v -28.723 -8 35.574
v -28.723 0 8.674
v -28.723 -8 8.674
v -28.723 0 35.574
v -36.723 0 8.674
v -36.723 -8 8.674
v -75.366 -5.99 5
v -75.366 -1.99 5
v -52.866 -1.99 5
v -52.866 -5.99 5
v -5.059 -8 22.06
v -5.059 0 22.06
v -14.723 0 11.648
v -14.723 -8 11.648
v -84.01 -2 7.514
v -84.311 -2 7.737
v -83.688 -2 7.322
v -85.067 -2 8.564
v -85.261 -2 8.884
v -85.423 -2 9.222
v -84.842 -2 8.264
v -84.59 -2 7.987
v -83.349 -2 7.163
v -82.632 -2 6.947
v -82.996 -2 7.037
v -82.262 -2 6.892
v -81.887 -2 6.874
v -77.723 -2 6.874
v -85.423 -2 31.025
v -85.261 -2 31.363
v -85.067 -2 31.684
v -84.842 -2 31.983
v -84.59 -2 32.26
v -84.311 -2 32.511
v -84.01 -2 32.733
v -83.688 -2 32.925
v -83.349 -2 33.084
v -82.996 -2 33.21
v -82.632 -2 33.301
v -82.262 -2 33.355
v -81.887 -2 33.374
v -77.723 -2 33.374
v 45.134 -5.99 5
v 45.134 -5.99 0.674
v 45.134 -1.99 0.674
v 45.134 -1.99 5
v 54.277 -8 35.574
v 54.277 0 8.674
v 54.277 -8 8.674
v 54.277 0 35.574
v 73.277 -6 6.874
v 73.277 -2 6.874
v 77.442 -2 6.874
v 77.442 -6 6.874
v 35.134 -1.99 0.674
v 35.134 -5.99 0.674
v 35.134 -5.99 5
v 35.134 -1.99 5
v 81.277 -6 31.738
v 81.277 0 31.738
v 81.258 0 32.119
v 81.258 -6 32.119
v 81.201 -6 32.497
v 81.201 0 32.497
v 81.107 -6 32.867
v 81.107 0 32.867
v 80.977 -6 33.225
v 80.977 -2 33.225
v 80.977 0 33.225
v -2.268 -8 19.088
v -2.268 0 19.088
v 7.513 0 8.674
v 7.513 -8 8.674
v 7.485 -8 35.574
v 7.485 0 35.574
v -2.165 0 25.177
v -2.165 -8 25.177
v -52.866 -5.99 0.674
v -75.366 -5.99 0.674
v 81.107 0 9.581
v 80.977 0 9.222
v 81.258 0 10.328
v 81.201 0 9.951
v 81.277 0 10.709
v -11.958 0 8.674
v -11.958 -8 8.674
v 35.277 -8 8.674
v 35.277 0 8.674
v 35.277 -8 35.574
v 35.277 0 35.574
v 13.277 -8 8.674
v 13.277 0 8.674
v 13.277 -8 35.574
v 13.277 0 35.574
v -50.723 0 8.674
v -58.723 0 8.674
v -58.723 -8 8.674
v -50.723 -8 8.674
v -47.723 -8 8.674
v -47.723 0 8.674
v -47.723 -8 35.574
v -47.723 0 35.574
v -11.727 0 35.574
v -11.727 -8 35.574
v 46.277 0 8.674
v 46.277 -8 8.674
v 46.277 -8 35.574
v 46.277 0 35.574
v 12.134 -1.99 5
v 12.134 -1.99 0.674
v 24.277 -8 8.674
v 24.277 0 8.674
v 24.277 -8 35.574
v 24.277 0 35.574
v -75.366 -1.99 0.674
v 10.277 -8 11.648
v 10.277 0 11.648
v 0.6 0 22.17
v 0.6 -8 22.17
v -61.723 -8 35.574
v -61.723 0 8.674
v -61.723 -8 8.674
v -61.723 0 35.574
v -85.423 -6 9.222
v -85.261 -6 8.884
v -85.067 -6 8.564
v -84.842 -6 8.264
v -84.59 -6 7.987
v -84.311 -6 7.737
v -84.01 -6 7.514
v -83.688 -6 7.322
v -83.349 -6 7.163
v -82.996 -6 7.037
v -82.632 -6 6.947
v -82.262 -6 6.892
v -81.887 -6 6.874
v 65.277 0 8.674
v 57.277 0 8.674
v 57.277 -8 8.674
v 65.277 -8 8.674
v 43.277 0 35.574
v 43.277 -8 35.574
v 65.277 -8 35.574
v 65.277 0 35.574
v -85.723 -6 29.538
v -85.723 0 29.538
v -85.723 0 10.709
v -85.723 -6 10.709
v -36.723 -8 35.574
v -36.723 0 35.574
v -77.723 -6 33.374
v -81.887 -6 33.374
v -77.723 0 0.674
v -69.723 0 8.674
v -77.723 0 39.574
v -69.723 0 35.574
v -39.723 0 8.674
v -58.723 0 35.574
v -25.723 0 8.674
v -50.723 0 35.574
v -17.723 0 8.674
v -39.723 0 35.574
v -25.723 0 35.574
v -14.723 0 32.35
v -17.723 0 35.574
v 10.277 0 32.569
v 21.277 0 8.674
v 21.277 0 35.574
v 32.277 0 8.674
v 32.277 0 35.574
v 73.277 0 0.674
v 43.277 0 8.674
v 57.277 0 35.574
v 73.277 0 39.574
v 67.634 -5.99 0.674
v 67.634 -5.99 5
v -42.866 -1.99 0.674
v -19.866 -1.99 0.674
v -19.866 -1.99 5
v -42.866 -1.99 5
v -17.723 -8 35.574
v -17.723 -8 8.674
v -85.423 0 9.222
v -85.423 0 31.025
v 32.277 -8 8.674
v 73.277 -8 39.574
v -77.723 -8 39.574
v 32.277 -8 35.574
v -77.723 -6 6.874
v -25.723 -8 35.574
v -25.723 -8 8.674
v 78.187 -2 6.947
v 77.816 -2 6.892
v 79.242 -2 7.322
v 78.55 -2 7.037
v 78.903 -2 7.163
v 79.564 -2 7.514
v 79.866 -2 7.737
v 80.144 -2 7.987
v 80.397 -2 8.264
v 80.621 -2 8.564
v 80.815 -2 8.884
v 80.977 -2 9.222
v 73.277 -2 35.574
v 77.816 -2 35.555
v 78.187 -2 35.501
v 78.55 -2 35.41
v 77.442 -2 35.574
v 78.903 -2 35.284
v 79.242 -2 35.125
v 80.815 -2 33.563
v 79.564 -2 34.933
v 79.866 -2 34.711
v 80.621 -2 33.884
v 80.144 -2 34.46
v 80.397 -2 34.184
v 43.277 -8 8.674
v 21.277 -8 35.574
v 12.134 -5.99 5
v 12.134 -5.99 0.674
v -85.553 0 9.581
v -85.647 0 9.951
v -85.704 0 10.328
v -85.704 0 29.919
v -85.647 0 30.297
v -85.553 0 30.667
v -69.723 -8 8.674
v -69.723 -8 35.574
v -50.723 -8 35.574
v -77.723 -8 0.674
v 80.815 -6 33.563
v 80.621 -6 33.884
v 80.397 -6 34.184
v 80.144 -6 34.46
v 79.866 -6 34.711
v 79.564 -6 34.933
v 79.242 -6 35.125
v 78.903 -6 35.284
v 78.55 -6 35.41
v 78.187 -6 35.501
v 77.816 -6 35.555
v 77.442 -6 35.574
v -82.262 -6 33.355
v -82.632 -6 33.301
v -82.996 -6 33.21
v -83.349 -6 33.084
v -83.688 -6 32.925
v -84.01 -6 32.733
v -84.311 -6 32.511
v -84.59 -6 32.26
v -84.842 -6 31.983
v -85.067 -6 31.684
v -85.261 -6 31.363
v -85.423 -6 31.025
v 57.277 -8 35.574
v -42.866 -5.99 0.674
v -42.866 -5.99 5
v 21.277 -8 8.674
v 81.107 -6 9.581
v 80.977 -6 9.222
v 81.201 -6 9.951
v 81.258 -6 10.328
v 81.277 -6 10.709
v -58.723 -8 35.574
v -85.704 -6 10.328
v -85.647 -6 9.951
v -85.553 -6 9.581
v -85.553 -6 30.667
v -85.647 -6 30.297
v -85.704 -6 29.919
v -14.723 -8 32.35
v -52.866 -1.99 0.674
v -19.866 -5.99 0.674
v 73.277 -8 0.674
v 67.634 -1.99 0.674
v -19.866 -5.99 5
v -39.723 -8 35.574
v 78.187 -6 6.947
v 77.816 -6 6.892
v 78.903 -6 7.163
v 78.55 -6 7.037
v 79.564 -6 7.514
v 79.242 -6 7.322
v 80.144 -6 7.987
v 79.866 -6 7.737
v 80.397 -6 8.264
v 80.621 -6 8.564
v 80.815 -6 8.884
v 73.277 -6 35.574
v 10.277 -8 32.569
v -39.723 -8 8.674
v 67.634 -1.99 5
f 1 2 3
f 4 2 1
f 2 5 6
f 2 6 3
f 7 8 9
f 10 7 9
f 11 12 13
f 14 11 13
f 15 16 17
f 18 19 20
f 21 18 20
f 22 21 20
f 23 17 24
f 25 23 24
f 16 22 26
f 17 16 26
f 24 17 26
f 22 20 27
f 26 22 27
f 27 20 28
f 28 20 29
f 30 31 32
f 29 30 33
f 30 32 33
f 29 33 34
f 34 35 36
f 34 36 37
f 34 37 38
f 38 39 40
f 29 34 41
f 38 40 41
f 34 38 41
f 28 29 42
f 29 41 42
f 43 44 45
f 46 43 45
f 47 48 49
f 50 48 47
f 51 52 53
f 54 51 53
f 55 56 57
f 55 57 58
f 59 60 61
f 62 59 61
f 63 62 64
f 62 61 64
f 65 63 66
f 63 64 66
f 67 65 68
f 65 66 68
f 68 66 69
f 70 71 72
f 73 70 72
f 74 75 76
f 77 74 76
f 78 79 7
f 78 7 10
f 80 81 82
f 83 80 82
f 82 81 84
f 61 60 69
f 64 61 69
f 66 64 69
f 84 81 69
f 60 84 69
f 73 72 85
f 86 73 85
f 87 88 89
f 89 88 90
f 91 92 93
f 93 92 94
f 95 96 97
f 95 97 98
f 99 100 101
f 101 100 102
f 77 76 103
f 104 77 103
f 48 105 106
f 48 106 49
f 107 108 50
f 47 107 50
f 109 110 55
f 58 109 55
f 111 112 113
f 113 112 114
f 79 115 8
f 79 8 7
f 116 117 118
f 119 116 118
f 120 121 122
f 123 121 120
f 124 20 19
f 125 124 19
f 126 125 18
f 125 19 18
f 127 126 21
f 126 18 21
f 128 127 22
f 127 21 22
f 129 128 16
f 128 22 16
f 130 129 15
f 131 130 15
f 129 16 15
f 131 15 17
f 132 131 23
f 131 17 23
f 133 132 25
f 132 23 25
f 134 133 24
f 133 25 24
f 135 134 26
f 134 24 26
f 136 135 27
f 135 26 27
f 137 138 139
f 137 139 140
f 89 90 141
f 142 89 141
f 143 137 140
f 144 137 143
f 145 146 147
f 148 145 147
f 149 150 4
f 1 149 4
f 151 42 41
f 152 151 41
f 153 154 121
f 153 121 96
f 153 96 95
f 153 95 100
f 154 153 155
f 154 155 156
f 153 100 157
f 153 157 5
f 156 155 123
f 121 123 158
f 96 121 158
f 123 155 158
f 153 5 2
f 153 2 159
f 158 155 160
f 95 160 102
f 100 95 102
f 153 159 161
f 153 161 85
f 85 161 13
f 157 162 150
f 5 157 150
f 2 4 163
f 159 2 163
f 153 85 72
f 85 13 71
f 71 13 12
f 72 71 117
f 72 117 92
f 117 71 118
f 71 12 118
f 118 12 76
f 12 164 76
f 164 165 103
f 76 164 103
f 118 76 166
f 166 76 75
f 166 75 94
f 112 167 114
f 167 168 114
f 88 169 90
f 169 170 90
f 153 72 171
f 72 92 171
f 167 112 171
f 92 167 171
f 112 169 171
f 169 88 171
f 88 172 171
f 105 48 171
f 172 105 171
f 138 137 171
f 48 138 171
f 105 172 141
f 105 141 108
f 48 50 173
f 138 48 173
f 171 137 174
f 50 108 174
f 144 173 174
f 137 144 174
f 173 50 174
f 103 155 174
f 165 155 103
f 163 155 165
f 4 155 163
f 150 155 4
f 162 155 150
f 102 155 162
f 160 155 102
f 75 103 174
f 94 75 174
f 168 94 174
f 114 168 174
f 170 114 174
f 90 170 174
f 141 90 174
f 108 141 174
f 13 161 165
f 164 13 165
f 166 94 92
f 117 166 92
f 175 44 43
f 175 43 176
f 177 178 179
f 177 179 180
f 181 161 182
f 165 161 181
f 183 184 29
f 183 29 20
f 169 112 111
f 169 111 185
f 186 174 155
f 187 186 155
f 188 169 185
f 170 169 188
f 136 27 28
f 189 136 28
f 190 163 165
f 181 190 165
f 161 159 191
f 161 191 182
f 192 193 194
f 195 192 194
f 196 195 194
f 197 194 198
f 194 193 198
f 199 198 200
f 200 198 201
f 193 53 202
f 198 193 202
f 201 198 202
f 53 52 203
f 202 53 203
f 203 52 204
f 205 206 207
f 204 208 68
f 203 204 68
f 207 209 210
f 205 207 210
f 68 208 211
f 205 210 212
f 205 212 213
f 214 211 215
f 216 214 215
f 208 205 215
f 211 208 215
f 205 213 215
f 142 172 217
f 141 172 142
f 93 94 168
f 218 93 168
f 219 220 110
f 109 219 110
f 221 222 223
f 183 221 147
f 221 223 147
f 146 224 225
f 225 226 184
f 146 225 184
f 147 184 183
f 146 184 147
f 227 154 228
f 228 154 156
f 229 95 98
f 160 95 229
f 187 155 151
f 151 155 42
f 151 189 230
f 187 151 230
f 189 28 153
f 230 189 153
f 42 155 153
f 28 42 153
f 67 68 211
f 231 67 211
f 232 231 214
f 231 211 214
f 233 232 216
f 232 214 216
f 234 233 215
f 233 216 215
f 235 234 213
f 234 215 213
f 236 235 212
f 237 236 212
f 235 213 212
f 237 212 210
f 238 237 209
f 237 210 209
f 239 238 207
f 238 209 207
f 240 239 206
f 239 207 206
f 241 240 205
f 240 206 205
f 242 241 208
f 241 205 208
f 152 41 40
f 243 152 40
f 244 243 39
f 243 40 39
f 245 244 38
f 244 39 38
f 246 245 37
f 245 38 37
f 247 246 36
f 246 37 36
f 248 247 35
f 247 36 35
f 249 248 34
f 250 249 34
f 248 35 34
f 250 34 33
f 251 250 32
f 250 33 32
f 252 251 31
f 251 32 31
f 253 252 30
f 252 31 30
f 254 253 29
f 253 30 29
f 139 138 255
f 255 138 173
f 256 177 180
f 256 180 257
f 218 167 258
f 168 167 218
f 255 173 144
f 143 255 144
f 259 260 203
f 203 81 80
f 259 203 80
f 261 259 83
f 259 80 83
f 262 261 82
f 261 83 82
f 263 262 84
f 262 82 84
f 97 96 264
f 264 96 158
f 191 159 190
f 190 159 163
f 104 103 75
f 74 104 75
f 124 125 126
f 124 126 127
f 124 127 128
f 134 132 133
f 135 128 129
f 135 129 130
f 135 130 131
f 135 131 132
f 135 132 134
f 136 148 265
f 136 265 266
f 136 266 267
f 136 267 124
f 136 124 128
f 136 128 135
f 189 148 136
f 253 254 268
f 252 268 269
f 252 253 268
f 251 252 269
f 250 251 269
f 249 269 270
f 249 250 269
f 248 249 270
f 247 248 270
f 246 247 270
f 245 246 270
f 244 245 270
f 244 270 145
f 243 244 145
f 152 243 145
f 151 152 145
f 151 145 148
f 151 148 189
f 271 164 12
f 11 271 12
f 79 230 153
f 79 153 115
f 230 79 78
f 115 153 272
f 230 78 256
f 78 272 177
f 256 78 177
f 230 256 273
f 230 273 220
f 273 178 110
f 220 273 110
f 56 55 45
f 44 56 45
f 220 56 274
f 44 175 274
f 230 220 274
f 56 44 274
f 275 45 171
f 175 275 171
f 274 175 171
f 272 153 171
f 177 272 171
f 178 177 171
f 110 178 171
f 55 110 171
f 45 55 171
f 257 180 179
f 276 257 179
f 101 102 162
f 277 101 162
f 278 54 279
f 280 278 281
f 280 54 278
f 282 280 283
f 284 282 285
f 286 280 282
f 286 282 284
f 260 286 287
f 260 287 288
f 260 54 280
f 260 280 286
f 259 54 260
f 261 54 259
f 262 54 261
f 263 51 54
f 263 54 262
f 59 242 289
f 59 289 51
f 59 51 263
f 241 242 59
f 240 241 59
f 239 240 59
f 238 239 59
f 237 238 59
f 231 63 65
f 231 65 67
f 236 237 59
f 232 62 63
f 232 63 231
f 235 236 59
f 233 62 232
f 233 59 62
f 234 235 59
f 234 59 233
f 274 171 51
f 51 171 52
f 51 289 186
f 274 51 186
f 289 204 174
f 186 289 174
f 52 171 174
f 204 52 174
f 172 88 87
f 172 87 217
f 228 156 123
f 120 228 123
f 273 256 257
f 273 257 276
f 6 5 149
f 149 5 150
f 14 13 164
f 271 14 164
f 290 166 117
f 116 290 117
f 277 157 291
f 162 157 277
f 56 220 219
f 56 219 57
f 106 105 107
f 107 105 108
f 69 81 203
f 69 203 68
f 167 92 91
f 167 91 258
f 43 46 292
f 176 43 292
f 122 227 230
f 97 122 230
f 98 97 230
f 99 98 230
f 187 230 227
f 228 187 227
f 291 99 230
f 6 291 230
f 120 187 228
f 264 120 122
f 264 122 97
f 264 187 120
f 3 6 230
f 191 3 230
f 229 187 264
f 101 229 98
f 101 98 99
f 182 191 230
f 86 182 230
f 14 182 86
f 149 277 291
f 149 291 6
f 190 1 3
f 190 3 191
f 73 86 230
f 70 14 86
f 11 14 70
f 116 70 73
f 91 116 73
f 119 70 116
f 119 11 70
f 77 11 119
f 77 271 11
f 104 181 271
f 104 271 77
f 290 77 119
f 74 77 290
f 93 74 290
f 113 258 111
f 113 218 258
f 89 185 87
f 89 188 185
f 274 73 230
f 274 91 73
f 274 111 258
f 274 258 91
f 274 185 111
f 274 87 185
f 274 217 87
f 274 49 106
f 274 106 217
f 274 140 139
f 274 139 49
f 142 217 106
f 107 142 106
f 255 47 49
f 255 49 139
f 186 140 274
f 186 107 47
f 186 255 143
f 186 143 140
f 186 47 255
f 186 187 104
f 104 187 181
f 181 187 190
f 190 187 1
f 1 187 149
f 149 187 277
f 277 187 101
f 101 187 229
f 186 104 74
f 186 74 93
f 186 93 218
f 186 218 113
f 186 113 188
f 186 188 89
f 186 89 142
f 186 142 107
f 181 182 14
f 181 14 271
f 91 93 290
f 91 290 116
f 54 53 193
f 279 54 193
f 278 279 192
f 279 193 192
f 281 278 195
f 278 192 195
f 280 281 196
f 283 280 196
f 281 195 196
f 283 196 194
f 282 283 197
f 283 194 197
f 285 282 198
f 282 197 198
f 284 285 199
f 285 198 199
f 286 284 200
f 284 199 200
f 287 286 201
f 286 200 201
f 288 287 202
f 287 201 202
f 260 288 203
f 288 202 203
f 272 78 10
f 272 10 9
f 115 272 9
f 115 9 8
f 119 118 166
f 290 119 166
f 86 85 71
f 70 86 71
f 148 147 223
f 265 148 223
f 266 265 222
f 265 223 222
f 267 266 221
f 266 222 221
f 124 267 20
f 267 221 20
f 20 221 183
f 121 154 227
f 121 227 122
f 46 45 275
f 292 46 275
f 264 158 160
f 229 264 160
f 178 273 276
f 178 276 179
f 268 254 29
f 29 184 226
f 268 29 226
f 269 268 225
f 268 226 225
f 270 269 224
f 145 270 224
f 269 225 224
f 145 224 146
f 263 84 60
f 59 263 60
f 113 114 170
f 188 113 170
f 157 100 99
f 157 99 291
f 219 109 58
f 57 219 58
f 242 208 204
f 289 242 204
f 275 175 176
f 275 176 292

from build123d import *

# Parameters (mm, degrees)
F0_W     = 8
F0_H     = 26.900017
F1_DEPTH = 6
F2_DEPTH = 2
F3_DEPTH = 8
F4_W     = 23
F4_H     = 4
F4_W_2   = 22.5
F5_DEPTH = 5


with BuildPart() as f1:
    # F0 (on Front) → F1 (new body)
    with BuildSketch(Plane.XZ):
        with BuildLine():
            Line((-85.422808, 9.222019), (-85.422808, 31.025267))
            ThreePointArc((-85.422808, 31.025267), (-85.64706, 30.296735), (-85.722808, 29.538243))
            Line((-85.722808, 29.538243), (-85.722808, 10.709043))
            ThreePointArc((-85.722808, 10.709043), (-85.64706, 9.950551), (-85.422808, 9.222019))
        make_face()
        with BuildLine():
            ThreePointArc((81.277192, 31.73826), (81.201444, 32.496752), (80.977192, 33.225284))
            Line((80.977192, 33.225284), (80.977192, 9.222019))
            ThreePointArc((80.977192, 9.222019), (81.201444, 9.950551), (81.277192, 10.709043))
            Line((81.277192, 10.709043), (81.277192, 31.73826))
        make_face()
        with BuildLine():
            Line((77.441792, 35.57366), (73.277192, 35.57366))
            Line((73.277192, 35.57366), (73.277192, 11.555429))
            Line((73.277192, 11.555429), (73.277192, 8.673643))
            Line((73.277192, 8.673643), (73.277192, 6.873643))
            Line((73.277192, 6.873643), (77.441792, 6.873643))
            ThreePointArc((77.441792, 6.873643), (79.563932, 7.514232), (80.977192, 9.222019))
            Line((80.977192, 9.222019), (80.977192, 33.225284))
            ThreePointArc((80.977192, 33.225284), (79.563932, 34.93307), (77.441792, 35.57366))
        make_face()
        Polygon((-69.722808, 39.57366), (-77.722808, 39.57366), (-77.722808, 35.57366), (-77.722808, 33.373643), (-77.722808, 15.555412), (-77.722808, 8.673643), (-77.722808, 6.873643), (-77.722808, 0.673643), (-69.722808, 0.673643), (65.277192, 0.673643), (73.277192, 0.673643), (73.277192, 6.873643), (73.277192, 8.673643), (73.277192, 11.555429), (73.277192, 35.57366), (73.277192, 39.57366), (65.277192, 39.57366), align=None)
        Polygon((-11.958453, 8.673643), (-2.267612, 19.087933), (7.512836, 8.673643), align=None, mode=Mode.SUBTRACT)
        with Locations((-65.722808, 22.123651)):
            Rectangle(F0_W, F0_H, mode=Mode.SUBTRACT)
        with Locations((-54.722808, 22.123651)):
            Rectangle(F0_W, F0_H, mode=Mode.SUBTRACT)
        with Locations((-43.722808, 22.123651)):
            Rectangle(F0_W, F0_H, mode=Mode.SUBTRACT)
        with Locations((-32.722808, 22.123651)):
            Rectangle(F0_W, F0_H, mode=Mode.SUBTRACT)
        with Locations((-21.722808, 22.123651)):
            Rectangle(F0_W, F0_H, mode=Mode.SUBTRACT)
        Polygon((-14.722808, 11.648091), (-14.722808, 32.350313), (-5.058615, 22.059812), align=None, mode=Mode.SUBTRACT)
        Polygon((0.600276, 22.169918), (10.277192, 32.569243), (10.277192, 11.648091), align=None, mode=Mode.SUBTRACT)
        with Locations((17.277192, 22.123651)):
            Rectangle(F0_W, F0_H, mode=Mode.SUBTRACT)
        with Locations((28.277192, 22.123651)):
            Rectangle(F0_W, F0_H, mode=Mode.SUBTRACT)
        with Locations((39.277192, 22.123651)):
            Rectangle(F0_W, F0_H, mode=Mode.SUBTRACT)
        with Locations((50.277192, 22.123651)):
            Rectangle(F0_W, F0_H, mode=Mode.SUBTRACT)
        with Locations((61.277192, 22.123651)):
            Rectangle(F0_W, F0_H, mode=Mode.SUBTRACT)
        Polygon((7.484984, 35.57366), (-2.165283, 25.176943), (-11.727135, 35.57366), align=None, mode=Mode.SUBTRACT)
        with BuildLine():
            Line((-77.722808, 15.555412), (-77.722808, 33.373643))
            Line((-77.722808, 33.373643), (-81.887408, 33.373643))
            ThreePointArc((-81.887408, 33.373643), (-84.009549, 32.733053), (-85.422808, 31.025267))
            Line((-85.422808, 31.025267), (-85.422808, 9.222019))
            ThreePointArc((-85.422808, 9.222019), (-84.009549, 7.514232), (-81.887408, 6.873643))
            Line((-81.887408, 6.873643), (-77.722808, 6.873643))
            Line((-77.722808, 6.873643), (-77.722808, 8.673643))
            Line((-77.722808, 8.673643), (-77.722808, 15.555412))
        make_face()
    extrude(amount=F1_DEPTH)

    # F0 (on Front) → F2 (cut)
    with BuildSketch(Plane.XZ):
        with BuildLine():
            Line((-77.722808, 15.555412), (-77.722808, 33.373643))
            Line((-77.722808, 33.373643), (-81.887408, 33.373643))
            ThreePointArc((-81.887408, 33.373643), (-84.009549, 32.733053), (-85.422808, 31.025267))
            Line((-85.422808, 31.025267), (-85.422808, 9.222019))
            ThreePointArc((-85.422808, 9.222019), (-84.009549, 7.514232), (-81.887408, 6.873643))
            Line((-81.887408, 6.873643), (-77.722808, 6.873643))
            Line((-77.722808, 6.873643), (-77.722808, 8.673643))
            Line((-77.722808, 8.673643), (-77.722808, 15.555412))
        make_face()
        with BuildLine():
            Line((77.441792, 35.57366), (73.277192, 35.57366))
            Line((73.277192, 35.57366), (73.277192, 11.555429))
            Line((73.277192, 11.555429), (73.277192, 8.673643))
            Line((73.277192, 8.673643), (73.277192, 6.873643))
            Line((73.277192, 6.873643), (77.441792, 6.873643))
            ThreePointArc((77.441792, 6.873643), (79.563932, 7.514232), (80.977192, 9.222019))
            Line((80.977192, 9.222019), (80.977192, 33.225284))
            ThreePointArc((80.977192, 33.225284), (79.563932, 34.93307), (77.441792, 35.57366))
        make_face()
    extrude(amount=F2_DEPTH, mode=Mode.SUBTRACT)

    # F0 (on Front) → F3 (join)
    with BuildSketch(Plane.XZ):
        Polygon((-69.722808, 39.57366), (-77.722808, 39.57366), (-77.722808, 35.57366), (-77.722808, 33.373643), (-77.722808, 15.555412), (-77.722808, 8.673643), (-77.722808, 6.873643), (-77.722808, 0.673643), (-69.722808, 0.673643), (65.277192, 0.673643), (73.277192, 0.673643), (73.277192, 6.873643), (73.277192, 8.673643), (73.277192, 11.555429), (73.277192, 35.57366), (73.277192, 39.57366), (65.277192, 39.57366), align=None)
        Polygon((-11.958453, 8.673643), (-2.267612, 19.087933), (7.512836, 8.673643), align=None, mode=Mode.SUBTRACT)
        with Locations((-65.722808, 22.123651)):
            Rectangle(F0_W, F0_H, mode=Mode.SUBTRACT)
        with Locations((-54.722808, 22.123651)):
            Rectangle(F0_W, F0_H, mode=Mode.SUBTRACT)
        with Locations((-43.722808, 22.123651)):
            Rectangle(F0_W, F0_H, mode=Mode.SUBTRACT)
        with Locations((-32.722808, 22.123651)):
            Rectangle(F0_W, F0_H, mode=Mode.SUBTRACT)
        with Locations((-21.722808, 22.123651)):
            Rectangle(F0_W, F0_H, mode=Mode.SUBTRACT)
        Polygon((-14.722808, 11.648091), (-14.722808, 32.350313), (-5.058615, 22.059812), align=None, mode=Mode.SUBTRACT)
        Polygon((0.600276, 22.169918), (10.277192, 32.569243), (10.277192, 11.648091), align=None, mode=Mode.SUBTRACT)
        with Locations((17.277192, 22.123651)):
            Rectangle(F0_W, F0_H, mode=Mode.SUBTRACT)
        with Locations((28.277192, 22.123651)):
            Rectangle(F0_W, F0_H, mode=Mode.SUBTRACT)
        with Locations((39.277192, 22.123651)):
            Rectangle(F0_W, F0_H, mode=Mode.SUBTRACT)
        with Locations((50.277192, 22.123651)):
            Rectangle(F0_W, F0_H, mode=Mode.SUBTRACT)
        with Locations((61.277192, 22.123651)):
            Rectangle(F0_W, F0_H, mode=Mode.SUBTRACT)
        Polygon((7.484984, 35.57366), (-2.165283, 25.176943), (-11.727135, 35.57366), align=None, mode=Mode.SUBTRACT)
    extrude(amount=F3_DEPTH)

    # F4 (on Top) → F5 (cut)
    with BuildSketch(Plane.XY):
        Polygon((-75.366058, -1.990048), (-75.366058, -5.990048), (-52.866058, -5.990048), (-52.866058, -3.990048), (-52.866058, -1.990048), align=None)
        Polygon((-42.866058, -1.990048), (-42.866058, -5.990048), (-19.866058, -5.990048), (-19.866058, -3.990048), (-19.866058, -1.990048), align=None)
        with Locations((23.633942, -3.990048)):
            Rectangle(F4_W, F4_H)
        with Locations((56.383942, -3.990048)):
            Rectangle(F4_W_2, F4_H)
    extrude(amount=F5_DEPTH, mode=Mode.SUBTRACT)


solid = f1.part
